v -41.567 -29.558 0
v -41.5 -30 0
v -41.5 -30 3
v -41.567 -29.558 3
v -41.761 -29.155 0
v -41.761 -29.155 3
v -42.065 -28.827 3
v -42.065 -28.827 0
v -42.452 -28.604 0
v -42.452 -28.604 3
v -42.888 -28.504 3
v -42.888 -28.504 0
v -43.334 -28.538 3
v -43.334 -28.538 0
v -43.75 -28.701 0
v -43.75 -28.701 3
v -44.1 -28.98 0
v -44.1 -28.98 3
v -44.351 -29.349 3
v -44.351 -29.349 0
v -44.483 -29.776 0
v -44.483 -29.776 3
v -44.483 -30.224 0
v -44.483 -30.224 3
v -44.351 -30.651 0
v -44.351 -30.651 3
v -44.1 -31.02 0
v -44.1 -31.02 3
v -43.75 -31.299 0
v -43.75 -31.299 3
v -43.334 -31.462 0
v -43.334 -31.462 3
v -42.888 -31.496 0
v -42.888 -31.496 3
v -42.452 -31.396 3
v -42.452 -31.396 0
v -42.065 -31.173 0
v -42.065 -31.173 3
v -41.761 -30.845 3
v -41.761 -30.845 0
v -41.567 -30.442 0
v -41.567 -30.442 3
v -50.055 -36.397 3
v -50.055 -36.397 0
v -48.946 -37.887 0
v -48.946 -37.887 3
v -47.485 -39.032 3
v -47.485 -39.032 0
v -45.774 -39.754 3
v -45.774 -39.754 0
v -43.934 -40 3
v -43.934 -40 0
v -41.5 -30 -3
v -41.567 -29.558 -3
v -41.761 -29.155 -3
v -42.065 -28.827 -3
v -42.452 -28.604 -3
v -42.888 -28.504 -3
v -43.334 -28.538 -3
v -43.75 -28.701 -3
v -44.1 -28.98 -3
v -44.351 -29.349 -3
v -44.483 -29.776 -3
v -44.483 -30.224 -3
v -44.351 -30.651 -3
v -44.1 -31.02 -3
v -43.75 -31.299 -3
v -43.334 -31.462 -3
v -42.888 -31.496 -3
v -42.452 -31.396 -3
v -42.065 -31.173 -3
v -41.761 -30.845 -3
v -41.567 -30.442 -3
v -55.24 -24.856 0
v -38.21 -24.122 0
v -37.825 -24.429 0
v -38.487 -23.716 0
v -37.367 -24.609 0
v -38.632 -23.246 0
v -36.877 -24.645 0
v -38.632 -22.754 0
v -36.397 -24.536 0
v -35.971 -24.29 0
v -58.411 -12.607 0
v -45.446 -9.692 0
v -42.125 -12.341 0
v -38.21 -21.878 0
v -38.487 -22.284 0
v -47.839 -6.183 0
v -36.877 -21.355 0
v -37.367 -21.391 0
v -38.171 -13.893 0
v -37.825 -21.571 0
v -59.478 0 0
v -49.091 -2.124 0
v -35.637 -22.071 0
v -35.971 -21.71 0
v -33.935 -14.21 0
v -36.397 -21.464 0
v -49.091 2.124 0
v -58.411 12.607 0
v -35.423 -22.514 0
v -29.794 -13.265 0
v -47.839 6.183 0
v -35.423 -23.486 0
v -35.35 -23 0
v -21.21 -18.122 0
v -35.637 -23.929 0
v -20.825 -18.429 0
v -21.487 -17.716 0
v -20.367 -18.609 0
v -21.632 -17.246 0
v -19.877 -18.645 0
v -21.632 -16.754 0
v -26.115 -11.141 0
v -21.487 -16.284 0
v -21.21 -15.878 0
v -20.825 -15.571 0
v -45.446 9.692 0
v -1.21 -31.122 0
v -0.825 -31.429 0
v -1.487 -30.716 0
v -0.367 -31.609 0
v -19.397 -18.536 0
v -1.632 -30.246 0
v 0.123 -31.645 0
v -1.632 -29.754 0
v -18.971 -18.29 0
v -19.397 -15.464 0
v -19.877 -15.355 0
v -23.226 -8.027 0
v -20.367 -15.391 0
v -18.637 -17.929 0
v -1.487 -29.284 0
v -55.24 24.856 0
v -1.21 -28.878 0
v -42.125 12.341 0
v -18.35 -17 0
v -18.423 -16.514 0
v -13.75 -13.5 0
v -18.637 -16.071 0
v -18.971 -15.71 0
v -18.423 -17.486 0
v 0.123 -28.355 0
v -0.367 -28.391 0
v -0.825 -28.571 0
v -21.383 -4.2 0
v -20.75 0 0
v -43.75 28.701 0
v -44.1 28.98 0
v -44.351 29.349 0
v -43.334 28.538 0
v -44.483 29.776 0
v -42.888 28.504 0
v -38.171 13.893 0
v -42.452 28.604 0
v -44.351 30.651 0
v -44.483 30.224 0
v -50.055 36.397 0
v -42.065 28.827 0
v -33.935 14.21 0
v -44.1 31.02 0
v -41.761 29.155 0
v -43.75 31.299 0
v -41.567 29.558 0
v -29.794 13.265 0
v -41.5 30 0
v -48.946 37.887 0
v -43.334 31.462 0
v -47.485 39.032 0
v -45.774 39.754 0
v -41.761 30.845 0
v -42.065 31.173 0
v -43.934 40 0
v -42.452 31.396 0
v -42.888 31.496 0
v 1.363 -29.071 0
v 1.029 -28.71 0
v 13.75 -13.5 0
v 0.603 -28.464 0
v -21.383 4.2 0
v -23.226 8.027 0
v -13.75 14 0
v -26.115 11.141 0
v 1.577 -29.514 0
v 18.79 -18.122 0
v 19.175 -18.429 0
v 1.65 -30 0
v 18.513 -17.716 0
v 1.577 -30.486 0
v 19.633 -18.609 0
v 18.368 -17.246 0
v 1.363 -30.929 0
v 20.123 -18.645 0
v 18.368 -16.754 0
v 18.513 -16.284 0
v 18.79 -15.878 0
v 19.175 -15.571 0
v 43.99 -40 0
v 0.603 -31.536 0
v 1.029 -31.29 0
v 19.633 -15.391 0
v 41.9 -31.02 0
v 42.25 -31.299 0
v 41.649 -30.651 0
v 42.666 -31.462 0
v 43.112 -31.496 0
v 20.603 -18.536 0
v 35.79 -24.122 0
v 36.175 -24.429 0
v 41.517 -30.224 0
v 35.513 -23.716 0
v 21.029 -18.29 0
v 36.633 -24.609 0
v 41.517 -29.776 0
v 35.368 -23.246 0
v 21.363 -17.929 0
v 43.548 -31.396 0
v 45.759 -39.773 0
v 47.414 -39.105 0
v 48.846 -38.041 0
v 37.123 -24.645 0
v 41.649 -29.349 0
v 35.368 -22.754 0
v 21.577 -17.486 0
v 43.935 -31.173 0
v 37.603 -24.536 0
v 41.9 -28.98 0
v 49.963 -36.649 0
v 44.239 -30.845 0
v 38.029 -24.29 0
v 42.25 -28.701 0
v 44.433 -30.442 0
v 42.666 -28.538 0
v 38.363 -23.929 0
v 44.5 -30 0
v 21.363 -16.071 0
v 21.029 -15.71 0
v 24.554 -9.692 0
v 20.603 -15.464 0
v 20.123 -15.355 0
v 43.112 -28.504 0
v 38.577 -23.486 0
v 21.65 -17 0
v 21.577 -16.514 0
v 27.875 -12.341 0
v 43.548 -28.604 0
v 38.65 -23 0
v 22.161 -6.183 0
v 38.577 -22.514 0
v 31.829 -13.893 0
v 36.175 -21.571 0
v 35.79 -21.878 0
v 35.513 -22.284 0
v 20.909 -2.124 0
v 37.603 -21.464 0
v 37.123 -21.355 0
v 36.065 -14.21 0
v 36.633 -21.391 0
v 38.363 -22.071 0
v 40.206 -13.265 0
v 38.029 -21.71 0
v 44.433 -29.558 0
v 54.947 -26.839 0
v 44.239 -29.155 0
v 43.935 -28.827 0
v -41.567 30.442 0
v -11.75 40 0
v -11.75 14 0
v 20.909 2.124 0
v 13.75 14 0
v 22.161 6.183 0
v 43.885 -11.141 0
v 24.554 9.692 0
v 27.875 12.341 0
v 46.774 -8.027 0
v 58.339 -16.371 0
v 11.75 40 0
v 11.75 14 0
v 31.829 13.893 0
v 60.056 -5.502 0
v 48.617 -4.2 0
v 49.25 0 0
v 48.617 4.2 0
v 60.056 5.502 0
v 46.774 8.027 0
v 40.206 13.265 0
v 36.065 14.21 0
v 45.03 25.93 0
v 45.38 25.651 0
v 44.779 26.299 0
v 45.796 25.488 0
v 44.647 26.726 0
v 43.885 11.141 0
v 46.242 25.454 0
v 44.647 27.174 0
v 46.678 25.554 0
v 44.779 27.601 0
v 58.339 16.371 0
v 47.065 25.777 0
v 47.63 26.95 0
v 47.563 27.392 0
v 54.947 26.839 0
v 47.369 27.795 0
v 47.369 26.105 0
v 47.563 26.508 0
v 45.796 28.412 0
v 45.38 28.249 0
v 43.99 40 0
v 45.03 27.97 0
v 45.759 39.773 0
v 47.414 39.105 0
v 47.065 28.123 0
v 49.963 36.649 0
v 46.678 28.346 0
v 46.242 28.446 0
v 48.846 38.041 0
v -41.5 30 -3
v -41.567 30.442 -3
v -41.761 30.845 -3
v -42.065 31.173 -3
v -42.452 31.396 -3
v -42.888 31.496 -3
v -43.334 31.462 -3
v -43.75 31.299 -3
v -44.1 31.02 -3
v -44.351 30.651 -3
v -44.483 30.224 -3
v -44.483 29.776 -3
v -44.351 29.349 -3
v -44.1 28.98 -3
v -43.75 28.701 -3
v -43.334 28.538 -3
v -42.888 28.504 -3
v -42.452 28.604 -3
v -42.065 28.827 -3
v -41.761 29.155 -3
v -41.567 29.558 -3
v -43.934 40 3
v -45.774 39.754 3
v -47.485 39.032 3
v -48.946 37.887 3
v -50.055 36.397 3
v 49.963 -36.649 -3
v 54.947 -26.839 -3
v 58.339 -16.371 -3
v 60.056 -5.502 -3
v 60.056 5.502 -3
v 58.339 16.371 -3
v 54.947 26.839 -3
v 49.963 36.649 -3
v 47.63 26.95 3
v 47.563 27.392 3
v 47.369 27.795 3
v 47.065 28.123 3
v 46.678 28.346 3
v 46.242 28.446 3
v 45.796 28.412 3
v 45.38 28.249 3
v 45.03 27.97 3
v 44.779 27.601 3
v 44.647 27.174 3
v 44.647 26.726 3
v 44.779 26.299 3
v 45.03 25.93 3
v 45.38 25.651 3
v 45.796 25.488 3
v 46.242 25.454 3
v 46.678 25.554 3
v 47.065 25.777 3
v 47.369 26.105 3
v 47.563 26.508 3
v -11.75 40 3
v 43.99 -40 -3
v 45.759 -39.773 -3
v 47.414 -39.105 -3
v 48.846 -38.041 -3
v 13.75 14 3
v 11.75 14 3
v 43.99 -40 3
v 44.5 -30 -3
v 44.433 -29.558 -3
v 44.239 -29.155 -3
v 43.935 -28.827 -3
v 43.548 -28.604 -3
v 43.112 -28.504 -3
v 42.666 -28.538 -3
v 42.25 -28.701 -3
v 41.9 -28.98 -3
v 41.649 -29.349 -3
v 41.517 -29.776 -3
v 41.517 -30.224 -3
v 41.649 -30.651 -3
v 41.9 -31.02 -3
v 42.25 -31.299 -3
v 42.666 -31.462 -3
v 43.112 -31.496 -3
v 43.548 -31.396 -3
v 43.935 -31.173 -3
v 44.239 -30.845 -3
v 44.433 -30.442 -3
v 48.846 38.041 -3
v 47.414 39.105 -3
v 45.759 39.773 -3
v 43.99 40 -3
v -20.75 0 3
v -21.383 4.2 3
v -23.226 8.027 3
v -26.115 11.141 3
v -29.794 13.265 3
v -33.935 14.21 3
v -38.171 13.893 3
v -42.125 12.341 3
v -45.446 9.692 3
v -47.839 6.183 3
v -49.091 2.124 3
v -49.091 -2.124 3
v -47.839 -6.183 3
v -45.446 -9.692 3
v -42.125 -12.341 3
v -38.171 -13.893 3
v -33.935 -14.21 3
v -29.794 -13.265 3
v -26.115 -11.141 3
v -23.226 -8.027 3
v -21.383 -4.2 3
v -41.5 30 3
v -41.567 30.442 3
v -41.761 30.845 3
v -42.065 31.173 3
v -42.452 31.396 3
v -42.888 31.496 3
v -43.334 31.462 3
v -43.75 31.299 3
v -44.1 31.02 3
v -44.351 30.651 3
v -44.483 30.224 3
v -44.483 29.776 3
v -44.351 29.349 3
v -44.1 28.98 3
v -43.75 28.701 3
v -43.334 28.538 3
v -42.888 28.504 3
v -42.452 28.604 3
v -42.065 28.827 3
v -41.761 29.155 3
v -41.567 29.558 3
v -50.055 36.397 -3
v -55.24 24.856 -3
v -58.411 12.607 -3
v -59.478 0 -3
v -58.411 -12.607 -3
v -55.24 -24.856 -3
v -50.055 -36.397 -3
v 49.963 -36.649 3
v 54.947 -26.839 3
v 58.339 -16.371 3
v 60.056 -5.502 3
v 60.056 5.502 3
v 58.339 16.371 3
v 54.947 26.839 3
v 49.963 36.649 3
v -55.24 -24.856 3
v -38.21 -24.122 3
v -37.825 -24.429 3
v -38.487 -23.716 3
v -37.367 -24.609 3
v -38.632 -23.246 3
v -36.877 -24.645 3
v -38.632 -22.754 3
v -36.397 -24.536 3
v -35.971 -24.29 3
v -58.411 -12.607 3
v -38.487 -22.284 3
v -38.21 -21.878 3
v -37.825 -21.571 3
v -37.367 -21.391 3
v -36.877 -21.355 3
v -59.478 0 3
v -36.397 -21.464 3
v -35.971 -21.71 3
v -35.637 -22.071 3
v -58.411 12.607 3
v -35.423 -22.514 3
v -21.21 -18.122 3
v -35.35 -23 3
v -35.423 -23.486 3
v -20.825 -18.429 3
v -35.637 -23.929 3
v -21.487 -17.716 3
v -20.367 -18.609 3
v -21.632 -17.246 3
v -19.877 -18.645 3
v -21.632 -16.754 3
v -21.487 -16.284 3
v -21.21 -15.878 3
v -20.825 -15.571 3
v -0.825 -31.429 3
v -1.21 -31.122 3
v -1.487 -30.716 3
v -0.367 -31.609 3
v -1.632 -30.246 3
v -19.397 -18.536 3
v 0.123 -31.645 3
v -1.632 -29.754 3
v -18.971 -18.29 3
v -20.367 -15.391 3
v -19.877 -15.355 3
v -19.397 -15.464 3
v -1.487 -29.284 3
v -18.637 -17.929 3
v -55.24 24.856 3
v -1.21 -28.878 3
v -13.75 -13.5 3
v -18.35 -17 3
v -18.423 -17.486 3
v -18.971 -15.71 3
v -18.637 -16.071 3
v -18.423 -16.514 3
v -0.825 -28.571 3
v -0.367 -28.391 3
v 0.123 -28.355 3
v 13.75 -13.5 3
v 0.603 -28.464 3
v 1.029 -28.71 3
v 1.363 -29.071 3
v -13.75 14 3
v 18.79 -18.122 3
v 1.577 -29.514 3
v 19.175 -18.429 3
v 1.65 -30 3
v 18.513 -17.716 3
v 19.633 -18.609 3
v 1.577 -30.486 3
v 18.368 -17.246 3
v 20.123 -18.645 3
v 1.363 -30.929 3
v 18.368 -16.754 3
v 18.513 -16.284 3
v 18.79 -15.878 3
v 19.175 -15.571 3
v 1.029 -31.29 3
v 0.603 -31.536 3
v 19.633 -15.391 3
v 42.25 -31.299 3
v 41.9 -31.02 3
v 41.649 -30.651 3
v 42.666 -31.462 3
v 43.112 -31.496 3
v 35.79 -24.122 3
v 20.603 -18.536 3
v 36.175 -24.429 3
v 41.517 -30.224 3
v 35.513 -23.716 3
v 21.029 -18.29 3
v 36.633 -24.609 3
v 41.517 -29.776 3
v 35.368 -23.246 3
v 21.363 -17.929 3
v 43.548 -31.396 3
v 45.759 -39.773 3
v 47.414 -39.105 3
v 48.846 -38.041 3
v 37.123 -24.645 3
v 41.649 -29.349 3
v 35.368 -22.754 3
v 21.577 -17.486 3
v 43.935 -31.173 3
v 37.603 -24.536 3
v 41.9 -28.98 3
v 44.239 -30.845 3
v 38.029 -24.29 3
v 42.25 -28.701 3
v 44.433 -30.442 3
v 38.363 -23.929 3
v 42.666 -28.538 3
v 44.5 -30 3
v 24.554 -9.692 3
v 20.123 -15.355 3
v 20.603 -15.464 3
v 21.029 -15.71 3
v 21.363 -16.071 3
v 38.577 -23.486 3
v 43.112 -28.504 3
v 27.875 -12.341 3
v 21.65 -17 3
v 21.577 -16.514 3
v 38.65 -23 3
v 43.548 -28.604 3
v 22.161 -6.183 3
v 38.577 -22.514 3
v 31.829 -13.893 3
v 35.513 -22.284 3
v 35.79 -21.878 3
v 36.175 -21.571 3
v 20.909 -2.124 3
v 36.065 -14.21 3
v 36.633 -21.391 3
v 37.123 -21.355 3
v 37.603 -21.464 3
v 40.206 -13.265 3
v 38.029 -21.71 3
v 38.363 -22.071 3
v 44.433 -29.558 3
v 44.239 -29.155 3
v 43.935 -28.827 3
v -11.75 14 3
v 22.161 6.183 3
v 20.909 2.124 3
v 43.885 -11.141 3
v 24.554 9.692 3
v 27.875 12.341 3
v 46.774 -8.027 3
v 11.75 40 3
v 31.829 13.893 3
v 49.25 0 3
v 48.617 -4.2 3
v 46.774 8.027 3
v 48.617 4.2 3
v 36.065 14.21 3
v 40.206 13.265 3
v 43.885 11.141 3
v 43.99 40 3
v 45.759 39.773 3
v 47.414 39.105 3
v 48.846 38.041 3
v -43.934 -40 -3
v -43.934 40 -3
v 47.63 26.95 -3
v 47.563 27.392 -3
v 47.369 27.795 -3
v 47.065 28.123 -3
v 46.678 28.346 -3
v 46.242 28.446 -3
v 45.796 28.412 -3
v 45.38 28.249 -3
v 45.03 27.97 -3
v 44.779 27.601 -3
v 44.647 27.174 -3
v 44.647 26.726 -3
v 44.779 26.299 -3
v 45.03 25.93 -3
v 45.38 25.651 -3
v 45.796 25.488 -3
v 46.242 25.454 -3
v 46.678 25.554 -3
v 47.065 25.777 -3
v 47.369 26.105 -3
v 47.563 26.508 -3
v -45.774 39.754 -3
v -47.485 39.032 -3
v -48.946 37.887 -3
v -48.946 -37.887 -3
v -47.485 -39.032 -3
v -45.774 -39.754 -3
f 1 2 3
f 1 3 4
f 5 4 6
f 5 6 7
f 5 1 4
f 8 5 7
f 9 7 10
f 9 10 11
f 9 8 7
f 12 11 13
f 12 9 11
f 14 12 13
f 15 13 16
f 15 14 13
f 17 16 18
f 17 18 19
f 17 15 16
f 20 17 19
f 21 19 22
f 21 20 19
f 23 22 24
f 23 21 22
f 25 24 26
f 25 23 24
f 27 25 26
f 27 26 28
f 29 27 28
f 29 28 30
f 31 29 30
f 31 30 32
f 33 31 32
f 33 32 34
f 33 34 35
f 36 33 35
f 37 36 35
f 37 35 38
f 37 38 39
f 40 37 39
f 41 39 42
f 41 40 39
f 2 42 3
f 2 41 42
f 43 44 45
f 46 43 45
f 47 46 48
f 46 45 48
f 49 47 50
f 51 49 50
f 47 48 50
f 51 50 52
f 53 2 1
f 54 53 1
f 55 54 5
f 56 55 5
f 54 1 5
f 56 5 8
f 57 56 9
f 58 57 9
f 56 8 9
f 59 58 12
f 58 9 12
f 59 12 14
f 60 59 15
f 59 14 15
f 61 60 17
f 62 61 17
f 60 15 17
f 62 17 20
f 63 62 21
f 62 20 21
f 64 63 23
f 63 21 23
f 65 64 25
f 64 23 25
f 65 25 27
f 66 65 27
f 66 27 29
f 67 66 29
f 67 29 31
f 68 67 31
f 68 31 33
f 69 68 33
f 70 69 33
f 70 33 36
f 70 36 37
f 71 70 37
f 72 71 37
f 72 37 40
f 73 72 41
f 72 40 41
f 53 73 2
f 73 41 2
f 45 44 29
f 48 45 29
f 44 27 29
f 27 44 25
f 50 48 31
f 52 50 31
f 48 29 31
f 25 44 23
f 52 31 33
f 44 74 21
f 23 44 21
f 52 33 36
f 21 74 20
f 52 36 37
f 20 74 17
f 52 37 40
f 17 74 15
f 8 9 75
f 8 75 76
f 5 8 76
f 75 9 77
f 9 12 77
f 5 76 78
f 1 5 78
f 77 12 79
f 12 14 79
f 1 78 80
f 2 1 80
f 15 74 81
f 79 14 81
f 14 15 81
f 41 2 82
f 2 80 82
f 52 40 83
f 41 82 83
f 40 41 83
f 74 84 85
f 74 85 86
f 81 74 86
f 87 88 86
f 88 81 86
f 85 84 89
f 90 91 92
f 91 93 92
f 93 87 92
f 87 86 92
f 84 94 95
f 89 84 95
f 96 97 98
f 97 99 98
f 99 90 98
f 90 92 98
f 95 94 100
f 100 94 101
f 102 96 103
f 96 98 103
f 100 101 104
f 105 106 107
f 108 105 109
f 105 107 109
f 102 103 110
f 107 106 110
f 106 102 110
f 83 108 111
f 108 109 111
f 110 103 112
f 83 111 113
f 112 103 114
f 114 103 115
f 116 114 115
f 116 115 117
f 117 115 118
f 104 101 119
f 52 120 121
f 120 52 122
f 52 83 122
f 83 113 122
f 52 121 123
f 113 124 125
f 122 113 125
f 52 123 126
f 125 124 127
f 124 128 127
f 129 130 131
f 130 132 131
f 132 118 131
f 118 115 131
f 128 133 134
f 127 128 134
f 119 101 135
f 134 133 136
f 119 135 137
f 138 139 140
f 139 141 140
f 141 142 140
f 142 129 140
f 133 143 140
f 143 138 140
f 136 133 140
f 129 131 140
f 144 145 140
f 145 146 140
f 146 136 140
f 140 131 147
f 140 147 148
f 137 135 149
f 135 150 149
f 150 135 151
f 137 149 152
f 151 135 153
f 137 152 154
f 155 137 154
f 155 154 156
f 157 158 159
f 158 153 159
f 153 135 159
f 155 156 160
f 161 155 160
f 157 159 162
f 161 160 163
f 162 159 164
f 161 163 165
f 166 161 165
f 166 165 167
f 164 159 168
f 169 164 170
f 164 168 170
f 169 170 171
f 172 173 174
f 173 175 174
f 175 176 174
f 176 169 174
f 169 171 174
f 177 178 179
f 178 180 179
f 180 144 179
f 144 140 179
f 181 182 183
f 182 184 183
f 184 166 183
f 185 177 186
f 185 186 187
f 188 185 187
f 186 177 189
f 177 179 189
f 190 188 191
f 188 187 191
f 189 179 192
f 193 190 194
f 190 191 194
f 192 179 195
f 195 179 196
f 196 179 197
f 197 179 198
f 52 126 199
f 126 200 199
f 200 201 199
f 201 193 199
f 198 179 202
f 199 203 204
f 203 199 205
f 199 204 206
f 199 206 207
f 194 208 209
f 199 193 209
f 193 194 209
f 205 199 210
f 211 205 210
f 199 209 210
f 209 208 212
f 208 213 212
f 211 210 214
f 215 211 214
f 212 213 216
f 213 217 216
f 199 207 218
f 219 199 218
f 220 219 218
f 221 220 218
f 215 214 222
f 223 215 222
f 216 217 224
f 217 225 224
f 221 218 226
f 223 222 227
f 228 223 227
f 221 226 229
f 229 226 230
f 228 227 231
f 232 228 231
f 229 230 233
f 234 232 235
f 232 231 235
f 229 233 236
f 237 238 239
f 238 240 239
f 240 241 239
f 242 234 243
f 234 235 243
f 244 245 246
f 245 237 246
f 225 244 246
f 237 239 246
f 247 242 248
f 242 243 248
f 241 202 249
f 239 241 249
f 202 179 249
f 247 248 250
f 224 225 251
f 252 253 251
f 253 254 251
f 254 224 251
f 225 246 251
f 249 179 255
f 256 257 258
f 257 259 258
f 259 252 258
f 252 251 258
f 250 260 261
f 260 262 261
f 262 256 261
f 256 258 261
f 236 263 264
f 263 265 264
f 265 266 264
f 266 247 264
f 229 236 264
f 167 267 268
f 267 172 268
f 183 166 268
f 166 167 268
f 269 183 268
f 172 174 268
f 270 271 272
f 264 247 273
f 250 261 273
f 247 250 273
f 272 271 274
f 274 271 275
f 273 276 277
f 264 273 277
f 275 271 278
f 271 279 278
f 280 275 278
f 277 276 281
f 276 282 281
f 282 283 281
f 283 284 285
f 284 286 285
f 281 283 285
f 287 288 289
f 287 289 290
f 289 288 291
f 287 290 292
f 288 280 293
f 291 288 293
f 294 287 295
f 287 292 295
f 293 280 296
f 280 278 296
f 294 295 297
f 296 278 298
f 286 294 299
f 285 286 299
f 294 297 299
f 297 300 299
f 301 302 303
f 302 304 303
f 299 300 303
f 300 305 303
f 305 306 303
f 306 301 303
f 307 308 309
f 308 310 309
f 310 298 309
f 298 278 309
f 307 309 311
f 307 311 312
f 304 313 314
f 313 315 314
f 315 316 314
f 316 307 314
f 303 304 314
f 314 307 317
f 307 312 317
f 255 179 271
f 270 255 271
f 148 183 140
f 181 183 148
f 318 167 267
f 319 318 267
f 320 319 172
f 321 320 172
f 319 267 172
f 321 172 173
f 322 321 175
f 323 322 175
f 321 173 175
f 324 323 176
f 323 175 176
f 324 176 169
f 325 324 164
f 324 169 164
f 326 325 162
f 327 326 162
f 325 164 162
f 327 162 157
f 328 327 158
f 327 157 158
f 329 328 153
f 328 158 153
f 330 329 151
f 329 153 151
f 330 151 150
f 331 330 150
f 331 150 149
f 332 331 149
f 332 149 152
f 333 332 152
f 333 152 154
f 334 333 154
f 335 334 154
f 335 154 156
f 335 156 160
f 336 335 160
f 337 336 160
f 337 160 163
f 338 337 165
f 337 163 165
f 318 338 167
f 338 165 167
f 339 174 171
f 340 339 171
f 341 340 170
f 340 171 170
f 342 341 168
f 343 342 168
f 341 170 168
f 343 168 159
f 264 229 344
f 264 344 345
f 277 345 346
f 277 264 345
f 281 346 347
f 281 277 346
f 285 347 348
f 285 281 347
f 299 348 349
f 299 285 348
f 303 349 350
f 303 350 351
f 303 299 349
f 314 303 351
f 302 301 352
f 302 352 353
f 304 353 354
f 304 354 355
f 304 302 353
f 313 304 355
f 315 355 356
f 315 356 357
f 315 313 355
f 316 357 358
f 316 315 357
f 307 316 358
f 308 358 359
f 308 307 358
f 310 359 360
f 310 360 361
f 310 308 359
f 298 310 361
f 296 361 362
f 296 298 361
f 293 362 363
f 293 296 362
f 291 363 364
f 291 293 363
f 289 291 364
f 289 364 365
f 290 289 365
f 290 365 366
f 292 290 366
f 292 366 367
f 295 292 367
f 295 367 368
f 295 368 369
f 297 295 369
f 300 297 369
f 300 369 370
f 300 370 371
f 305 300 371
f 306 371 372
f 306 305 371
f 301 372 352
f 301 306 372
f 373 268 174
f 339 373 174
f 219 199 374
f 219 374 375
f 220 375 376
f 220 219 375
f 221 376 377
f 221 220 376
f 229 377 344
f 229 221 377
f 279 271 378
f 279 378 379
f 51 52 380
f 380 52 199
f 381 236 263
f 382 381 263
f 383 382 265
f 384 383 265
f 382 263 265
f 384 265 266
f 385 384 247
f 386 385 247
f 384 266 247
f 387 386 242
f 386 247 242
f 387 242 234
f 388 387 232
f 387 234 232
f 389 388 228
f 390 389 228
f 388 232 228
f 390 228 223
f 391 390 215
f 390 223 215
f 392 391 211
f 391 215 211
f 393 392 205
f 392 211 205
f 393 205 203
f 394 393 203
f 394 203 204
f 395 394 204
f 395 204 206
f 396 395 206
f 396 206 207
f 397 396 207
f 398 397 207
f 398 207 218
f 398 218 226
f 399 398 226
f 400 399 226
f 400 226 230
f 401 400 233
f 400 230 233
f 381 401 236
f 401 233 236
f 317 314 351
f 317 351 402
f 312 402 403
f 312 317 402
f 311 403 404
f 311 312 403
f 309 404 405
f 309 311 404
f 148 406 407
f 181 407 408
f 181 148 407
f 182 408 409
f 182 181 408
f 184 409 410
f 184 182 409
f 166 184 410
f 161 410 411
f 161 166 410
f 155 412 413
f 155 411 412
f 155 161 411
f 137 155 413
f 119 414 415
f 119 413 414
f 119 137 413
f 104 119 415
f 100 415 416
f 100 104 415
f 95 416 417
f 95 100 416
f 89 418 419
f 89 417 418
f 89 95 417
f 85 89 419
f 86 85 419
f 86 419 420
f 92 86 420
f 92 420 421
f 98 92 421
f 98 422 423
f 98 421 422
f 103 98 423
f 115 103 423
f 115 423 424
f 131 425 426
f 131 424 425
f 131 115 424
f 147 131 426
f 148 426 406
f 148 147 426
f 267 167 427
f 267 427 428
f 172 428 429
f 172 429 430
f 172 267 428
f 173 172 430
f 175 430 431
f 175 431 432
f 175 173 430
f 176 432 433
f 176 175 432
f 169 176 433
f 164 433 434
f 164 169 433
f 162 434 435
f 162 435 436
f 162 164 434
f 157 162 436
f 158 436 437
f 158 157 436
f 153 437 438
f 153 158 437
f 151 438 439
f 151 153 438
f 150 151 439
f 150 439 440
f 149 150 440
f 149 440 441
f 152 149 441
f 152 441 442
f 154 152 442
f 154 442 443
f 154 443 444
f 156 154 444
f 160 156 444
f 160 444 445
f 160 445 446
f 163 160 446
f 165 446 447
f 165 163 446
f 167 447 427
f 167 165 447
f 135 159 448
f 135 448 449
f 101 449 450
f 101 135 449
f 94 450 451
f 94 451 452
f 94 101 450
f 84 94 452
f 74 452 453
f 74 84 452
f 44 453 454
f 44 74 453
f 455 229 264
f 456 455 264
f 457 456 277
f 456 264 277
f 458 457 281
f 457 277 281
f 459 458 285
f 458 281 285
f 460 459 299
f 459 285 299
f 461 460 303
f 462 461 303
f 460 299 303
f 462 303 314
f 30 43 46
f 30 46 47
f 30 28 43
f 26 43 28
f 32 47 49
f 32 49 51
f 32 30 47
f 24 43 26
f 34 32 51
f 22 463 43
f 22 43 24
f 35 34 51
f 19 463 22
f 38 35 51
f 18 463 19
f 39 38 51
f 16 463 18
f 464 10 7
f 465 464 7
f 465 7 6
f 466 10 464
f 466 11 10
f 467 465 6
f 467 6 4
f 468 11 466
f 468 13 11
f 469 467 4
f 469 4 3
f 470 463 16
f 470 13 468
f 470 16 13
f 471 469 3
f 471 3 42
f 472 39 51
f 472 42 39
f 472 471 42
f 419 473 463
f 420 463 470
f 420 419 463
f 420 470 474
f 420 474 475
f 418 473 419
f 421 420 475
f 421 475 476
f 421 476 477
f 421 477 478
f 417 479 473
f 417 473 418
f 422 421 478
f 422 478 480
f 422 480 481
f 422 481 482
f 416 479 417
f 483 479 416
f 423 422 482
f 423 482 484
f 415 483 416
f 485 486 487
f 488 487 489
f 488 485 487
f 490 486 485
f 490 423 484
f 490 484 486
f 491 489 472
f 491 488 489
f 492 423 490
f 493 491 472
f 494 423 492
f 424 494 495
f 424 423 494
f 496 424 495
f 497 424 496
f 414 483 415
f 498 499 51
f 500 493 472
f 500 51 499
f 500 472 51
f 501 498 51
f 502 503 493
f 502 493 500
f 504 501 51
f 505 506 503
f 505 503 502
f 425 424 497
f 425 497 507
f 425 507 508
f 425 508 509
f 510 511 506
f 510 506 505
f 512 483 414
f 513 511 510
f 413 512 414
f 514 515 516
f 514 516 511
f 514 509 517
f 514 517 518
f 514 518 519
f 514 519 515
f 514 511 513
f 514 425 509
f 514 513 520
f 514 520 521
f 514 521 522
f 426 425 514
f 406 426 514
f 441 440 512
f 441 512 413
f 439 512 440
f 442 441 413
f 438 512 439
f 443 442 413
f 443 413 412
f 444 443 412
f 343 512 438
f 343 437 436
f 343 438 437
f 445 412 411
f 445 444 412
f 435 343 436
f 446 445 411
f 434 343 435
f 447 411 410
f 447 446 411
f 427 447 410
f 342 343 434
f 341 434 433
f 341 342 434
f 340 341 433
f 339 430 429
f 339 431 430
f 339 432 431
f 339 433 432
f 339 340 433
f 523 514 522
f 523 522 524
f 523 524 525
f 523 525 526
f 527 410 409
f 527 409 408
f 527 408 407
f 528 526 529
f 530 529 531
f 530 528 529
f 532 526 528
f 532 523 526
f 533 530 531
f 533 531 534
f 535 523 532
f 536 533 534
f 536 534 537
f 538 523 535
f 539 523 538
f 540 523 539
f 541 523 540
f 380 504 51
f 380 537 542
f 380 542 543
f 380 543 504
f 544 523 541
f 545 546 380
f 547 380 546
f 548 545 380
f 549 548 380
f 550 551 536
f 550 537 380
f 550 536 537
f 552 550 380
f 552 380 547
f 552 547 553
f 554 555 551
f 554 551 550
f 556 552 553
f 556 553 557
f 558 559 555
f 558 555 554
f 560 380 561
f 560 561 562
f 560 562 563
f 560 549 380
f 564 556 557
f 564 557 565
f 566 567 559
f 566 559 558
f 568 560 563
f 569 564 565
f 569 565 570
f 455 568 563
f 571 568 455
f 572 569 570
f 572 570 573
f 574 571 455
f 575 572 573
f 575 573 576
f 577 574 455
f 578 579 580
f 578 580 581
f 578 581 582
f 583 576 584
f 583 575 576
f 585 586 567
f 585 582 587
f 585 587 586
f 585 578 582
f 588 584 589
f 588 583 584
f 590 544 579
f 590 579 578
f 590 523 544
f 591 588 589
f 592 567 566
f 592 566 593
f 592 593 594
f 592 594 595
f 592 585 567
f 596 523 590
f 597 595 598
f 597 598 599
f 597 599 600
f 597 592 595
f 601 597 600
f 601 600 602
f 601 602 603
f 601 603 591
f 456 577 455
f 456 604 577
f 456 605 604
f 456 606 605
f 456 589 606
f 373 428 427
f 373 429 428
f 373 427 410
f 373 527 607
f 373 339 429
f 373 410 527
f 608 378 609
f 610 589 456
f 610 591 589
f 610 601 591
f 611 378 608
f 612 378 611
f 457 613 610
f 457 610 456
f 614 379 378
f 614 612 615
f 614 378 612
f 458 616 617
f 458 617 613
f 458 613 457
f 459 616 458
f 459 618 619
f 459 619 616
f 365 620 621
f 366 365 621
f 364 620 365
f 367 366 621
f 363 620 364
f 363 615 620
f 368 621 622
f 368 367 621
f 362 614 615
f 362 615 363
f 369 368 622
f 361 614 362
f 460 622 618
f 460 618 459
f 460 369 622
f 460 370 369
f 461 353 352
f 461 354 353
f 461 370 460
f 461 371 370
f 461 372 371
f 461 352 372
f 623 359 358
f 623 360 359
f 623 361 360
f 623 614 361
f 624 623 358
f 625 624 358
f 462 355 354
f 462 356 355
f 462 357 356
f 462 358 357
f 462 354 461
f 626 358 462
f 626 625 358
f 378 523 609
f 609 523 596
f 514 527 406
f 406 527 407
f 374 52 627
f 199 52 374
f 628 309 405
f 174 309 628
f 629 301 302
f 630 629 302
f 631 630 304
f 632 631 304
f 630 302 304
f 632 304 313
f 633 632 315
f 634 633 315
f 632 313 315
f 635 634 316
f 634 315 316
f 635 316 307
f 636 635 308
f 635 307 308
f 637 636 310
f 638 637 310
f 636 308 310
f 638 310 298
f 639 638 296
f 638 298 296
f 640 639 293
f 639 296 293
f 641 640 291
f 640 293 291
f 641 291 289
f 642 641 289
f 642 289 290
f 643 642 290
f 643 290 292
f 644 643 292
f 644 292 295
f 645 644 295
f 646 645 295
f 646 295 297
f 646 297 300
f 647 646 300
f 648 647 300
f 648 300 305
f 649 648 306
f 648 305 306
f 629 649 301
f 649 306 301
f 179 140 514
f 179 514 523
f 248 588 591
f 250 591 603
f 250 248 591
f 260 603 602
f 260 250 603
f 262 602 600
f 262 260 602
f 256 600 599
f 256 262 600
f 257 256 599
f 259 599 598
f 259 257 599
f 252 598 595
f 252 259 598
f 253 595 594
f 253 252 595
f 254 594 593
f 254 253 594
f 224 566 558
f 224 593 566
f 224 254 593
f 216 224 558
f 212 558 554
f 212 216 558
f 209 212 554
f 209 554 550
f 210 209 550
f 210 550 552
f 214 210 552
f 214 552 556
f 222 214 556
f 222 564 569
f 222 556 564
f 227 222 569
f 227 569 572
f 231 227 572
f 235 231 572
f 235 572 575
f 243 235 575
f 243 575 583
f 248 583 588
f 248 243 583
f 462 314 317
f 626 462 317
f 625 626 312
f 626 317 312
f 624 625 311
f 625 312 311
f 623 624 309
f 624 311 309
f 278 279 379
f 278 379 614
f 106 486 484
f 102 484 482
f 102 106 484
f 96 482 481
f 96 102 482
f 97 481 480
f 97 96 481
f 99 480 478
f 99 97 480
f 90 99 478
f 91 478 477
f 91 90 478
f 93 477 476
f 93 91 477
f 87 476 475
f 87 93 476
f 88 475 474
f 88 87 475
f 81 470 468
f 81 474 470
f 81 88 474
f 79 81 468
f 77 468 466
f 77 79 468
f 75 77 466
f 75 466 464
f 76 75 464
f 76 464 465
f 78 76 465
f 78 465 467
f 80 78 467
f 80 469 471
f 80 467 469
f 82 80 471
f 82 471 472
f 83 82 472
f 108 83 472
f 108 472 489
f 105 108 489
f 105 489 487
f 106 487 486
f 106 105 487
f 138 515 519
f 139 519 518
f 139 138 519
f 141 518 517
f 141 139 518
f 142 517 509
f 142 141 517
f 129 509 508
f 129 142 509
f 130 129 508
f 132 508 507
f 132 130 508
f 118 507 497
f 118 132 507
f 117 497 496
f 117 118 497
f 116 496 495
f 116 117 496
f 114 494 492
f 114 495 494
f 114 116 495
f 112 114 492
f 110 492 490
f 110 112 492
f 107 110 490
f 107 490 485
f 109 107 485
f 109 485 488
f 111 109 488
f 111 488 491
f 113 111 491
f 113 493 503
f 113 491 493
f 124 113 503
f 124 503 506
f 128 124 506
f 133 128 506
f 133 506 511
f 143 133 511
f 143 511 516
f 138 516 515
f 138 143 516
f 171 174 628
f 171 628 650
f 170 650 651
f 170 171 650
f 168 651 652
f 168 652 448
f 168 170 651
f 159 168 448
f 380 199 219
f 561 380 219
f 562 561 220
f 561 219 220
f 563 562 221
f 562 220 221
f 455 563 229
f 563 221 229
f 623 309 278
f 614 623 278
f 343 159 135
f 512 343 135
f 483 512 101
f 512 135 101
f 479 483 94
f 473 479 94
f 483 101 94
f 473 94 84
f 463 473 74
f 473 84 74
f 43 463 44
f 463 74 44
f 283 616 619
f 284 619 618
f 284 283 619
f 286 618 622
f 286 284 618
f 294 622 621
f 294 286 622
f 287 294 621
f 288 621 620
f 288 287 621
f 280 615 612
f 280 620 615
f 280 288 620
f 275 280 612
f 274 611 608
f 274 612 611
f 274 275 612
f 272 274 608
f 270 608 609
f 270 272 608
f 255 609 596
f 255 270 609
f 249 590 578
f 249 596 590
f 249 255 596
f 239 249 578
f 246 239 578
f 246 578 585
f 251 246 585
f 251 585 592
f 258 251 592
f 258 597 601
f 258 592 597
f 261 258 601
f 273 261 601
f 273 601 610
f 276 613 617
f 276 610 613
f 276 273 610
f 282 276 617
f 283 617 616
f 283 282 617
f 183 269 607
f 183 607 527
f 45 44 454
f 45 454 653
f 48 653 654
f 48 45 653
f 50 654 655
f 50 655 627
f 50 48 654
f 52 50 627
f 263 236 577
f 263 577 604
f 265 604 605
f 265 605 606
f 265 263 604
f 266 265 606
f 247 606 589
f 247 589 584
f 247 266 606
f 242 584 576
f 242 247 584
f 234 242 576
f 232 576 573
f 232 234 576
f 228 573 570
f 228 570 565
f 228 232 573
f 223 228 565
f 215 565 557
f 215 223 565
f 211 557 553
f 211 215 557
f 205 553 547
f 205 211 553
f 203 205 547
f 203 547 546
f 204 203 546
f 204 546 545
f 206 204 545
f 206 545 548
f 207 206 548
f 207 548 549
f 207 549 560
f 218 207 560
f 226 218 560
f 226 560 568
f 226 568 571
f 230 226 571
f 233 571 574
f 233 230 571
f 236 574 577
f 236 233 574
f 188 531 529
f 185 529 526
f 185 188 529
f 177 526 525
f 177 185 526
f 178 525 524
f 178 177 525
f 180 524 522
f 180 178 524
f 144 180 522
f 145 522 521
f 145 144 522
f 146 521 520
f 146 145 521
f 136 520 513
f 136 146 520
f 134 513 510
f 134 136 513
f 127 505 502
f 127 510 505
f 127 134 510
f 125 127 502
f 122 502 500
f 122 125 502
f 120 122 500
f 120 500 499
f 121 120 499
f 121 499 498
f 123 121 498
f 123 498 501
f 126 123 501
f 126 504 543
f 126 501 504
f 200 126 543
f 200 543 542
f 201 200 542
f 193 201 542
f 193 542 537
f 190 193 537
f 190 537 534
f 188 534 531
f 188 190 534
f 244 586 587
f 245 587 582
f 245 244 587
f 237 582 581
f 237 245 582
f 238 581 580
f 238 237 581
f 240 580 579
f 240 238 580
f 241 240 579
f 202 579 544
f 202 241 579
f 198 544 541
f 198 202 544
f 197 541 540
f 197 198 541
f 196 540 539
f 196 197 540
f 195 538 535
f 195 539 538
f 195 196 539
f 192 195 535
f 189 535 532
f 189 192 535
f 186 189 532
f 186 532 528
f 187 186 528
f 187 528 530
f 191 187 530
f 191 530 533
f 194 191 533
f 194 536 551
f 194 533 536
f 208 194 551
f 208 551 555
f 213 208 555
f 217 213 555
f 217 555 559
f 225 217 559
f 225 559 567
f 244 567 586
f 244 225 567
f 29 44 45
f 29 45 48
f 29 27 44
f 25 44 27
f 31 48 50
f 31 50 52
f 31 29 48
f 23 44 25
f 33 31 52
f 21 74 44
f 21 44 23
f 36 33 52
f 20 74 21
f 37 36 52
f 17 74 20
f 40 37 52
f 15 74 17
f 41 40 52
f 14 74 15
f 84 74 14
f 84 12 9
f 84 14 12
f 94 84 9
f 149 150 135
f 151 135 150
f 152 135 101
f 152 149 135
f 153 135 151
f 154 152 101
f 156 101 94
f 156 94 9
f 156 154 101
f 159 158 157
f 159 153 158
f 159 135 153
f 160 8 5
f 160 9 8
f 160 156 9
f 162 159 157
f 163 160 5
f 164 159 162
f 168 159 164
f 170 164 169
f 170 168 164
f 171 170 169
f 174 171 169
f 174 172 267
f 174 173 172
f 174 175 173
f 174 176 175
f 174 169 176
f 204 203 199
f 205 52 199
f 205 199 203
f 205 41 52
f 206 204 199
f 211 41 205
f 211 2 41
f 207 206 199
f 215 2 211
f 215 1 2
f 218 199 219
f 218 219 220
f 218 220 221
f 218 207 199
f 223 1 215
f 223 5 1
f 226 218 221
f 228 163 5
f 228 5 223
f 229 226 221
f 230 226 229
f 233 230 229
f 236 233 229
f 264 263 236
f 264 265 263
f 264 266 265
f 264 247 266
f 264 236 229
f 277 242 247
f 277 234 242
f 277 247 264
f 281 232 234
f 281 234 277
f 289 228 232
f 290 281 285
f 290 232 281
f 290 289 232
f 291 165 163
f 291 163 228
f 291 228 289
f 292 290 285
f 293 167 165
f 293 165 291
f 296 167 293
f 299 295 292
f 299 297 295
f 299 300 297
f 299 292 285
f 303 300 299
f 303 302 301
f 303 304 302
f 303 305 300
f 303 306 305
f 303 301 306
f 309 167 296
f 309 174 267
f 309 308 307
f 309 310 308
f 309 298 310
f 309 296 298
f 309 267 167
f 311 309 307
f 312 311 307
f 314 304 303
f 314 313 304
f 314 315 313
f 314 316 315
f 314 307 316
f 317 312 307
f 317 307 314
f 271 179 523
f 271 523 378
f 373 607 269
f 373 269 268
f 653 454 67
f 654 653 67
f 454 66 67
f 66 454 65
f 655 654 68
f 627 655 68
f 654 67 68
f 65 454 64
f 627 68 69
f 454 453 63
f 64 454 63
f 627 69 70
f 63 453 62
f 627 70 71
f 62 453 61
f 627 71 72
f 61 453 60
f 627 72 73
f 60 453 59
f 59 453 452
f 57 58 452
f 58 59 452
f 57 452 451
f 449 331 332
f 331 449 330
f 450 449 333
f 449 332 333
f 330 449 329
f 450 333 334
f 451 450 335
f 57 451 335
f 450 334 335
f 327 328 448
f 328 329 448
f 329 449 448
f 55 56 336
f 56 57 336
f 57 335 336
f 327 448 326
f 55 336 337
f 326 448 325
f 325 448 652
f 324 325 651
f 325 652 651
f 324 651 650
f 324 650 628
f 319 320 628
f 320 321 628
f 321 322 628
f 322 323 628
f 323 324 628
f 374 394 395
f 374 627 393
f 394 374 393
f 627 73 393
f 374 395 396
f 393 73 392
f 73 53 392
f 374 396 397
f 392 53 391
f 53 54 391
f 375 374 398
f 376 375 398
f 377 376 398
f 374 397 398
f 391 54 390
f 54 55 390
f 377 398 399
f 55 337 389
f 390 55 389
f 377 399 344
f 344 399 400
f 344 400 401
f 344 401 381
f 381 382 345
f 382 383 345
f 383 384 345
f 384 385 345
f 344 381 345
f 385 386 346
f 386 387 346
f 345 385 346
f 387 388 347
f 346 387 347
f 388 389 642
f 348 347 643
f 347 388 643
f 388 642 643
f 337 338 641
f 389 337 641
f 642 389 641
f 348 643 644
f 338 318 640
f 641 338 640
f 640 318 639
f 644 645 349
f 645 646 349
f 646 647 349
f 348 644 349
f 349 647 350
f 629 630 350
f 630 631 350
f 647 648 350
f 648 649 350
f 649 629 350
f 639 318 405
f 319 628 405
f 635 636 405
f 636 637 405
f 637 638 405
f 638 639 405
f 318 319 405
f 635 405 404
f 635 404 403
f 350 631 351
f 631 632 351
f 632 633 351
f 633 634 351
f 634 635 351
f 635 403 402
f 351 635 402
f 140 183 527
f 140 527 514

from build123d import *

# Parameters (mm, degrees)
F0_R     = 1.5
F1_DEPTH = 3
F2_DEPTH = 3
F3_R     = 14.25
F3_R_2   = 1.65
F4_DEPTH = 25
F6_DEPTH = 3
F7_DEPTH = 3
F8_W     = 23.5
F8_H     = 37.6963340342
F9_DEPTH = 25


with BuildPart() as f1:
    # F0 (on Top) → F1 (new body)
    with BuildSketch(Plane.XY):
        with BuildLine():
            Line((45.1, 35), (-45.1, 35))
            ThreePointArc((-45.1, 35), (-54.4782217351, 0), (-45.1, -35))
            Line((-45.1, -35), (45.1, -35))
            ThreePointArc((45.1, -35), (55.2720579016, 0), (45.1, 35))
        make_face()
        with Locations((-43, -30)):
            Circle(F0_R, mode=Mode.SUBTRACT)
        with Locations((43, -30)):
            Circle(F0_R, mode=Mode.SUBTRACT)
        with Locations((-43, 30)):
            Circle(F0_R, mode=Mode.SUBTRACT)
        with Locations((46.13, 26.95)):
            Circle(F0_R, mode=Mode.SUBTRACT)
    extrude(amount=-F1_DEPTH)

    # F5 (on Top) → F6 (join)
    with BuildSketch(Plane.XY):
        with BuildLine():
            ThreePointArc((-50.0545445124, 36.3970588235), (-59.4782217351, 0), (-50.0545445124, -36.3970588235))
            ThreePointArc((-50.0545445124, -36.3970588235), (-47.4851853132, -39.0323880746), (-43.9340877199, -40))
            Line((-43.9340877199, -40), (43.9895550669, -40))
            ThreePointArc((43.9895550669, -40), (47.4140971022, -39.1051217718), (49.9630539635, -36.6492890995))
            ThreePointArc((49.9630539635, -36.6492890995), (60.2720579016, 0), (49.9630539635, 36.6492890995))
            ThreePointArc((49.9630539635, 36.6492890995), (47.4140971022, 39.1051217718), (43.9895550669, 40))
            Line((43.9895550669, 40), (-43.9340877199, 40))
            ThreePointArc((-43.9340877199, 40), (-47.4851853132, 39.0323880746), (-50.0545445124, 36.3970588235))
        make_face()
        with BuildLine():
            Line((44.5476018751, -34), (-44.5198739442, -34))
            ThreePointArc((-44.5198739442, -34), (-53.4782217351, 0), (-44.5198739442, 34))
            Line((-44.5198739442, 34), (44.5476018751, 34))
            ThreePointArc((44.5476018751, 34), (54.2720579016, 0), (44.5476018751, -34))
        make_face(mode=Mode.SUBTRACT)
    extrude(amount=-F6_DEPTH)


with BuildPart() as f2:
    # F0 (on Top) → F2 (new body)
    with BuildSketch(Plane.XY):
        with BuildLine():
            Line((45.1, 35), (-45.1, 35))
            ThreePointArc((-45.1, 35), (-54.4782217351, 0), (-45.1, -35))
            Line((-45.1, -35), (45.1, -35))
            ThreePointArc((45.1, -35), (55.2720579016, 0), (45.1, 35))
        make_face()
        with Locations((-43, -30)):
            Circle(F0_R, mode=Mode.SUBTRACT)
        with Locations((43, -30)):
            Circle(F0_R, mode=Mode.SUBTRACT)
        with Locations((-43, 30)):
            Circle(F0_R, mode=Mode.SUBTRACT)
        with Locations((46.13, 26.95)):
            Circle(F0_R, mode=Mode.SUBTRACT)
    extrude(amount=F2_DEPTH)

    # F3 (on Top) → F4 (cut)
    with BuildSketch(Plane.XY):
        Polygon((-11.75, 14), (-13.75, 14), (-13.75, -13.5), (13.75, -13.5), (13.75, 14), (11.75, 14), (11.75, 43.5743890703), (-11.75, 43.5743890703), align=None)
        with Locations((-35, 0)):
            Circle(F3_R)
        with Locations((35, 0)):
            Circle(F3_R)
        with Locations((-37, -23)):
            Circle(F3_R_2)
        with Locations((-20, -17)):
            Circle(F3_R_2)
        with Locations((0, -30)):
            Circle(F3_R_2)
        with Locations((37, -23)):
            Circle(F3_R_2)
        with Locations((20, -17)):
            Circle(F3_R_2)
    extrude(amount=F4_DEPTH, mode=Mode.SUBTRACT)

    # F5 (on Top) → F7 (join)
    with BuildSketch(Plane.XY):
        with BuildLine():
            ThreePointArc((-50.0545445124, 36.3970588235), (-59.4782217351, 0), (-50.0545445124, -36.3970588235))
            ThreePointArc((-50.0545445124, -36.3970588235), (-47.4851853132, -39.0323880746), (-43.9340877199, -40))
            Line((-43.9340877199, -40), (43.9895550669, -40))
            ThreePointArc((43.9895550669, -40), (47.4140971022, -39.1051217718), (49.9630539635, -36.6492890995))
            ThreePointArc((49.9630539635, -36.6492890995), (60.2720579016, 0), (49.9630539635, 36.6492890995))
            ThreePointArc((49.9630539635, 36.6492890995), (47.4140971022, 39.1051217718), (43.9895550669, 40))
            Line((43.9895550669, 40), (-43.9340877199, 40))
            ThreePointArc((-43.9340877199, 40), (-47.4851853132, 39.0323880746), (-50.0545445124, 36.3970588235))
        make_face()
        with BuildLine():
            Line((44.5476018751, -34), (-44.5198739442, -34))
            ThreePointArc((-44.5198739442, -34), (-53.4782217351, 0), (-44.5198739442, 34))
            Line((-44.5198739442, 34), (44.5476018751, 34))
            ThreePointArc((44.5476018751, 34), (54.2720579016, 0), (44.5476018751, -34))
        make_face(mode=Mode.SUBTRACT)
    extrude(amount=F7_DEPTH)

    # F8 (on face) → F9 (cut)
    with BuildSketch(Plane.XY.offset(3)):
        with Locations((0, 32.8481670171)):
            Rectangle(F8_W, F8_H)
    extrude(amount=-F9_DEPTH, mode=Mode.SUBTRACT)


solid = Compound([f1.part, f2.part])
